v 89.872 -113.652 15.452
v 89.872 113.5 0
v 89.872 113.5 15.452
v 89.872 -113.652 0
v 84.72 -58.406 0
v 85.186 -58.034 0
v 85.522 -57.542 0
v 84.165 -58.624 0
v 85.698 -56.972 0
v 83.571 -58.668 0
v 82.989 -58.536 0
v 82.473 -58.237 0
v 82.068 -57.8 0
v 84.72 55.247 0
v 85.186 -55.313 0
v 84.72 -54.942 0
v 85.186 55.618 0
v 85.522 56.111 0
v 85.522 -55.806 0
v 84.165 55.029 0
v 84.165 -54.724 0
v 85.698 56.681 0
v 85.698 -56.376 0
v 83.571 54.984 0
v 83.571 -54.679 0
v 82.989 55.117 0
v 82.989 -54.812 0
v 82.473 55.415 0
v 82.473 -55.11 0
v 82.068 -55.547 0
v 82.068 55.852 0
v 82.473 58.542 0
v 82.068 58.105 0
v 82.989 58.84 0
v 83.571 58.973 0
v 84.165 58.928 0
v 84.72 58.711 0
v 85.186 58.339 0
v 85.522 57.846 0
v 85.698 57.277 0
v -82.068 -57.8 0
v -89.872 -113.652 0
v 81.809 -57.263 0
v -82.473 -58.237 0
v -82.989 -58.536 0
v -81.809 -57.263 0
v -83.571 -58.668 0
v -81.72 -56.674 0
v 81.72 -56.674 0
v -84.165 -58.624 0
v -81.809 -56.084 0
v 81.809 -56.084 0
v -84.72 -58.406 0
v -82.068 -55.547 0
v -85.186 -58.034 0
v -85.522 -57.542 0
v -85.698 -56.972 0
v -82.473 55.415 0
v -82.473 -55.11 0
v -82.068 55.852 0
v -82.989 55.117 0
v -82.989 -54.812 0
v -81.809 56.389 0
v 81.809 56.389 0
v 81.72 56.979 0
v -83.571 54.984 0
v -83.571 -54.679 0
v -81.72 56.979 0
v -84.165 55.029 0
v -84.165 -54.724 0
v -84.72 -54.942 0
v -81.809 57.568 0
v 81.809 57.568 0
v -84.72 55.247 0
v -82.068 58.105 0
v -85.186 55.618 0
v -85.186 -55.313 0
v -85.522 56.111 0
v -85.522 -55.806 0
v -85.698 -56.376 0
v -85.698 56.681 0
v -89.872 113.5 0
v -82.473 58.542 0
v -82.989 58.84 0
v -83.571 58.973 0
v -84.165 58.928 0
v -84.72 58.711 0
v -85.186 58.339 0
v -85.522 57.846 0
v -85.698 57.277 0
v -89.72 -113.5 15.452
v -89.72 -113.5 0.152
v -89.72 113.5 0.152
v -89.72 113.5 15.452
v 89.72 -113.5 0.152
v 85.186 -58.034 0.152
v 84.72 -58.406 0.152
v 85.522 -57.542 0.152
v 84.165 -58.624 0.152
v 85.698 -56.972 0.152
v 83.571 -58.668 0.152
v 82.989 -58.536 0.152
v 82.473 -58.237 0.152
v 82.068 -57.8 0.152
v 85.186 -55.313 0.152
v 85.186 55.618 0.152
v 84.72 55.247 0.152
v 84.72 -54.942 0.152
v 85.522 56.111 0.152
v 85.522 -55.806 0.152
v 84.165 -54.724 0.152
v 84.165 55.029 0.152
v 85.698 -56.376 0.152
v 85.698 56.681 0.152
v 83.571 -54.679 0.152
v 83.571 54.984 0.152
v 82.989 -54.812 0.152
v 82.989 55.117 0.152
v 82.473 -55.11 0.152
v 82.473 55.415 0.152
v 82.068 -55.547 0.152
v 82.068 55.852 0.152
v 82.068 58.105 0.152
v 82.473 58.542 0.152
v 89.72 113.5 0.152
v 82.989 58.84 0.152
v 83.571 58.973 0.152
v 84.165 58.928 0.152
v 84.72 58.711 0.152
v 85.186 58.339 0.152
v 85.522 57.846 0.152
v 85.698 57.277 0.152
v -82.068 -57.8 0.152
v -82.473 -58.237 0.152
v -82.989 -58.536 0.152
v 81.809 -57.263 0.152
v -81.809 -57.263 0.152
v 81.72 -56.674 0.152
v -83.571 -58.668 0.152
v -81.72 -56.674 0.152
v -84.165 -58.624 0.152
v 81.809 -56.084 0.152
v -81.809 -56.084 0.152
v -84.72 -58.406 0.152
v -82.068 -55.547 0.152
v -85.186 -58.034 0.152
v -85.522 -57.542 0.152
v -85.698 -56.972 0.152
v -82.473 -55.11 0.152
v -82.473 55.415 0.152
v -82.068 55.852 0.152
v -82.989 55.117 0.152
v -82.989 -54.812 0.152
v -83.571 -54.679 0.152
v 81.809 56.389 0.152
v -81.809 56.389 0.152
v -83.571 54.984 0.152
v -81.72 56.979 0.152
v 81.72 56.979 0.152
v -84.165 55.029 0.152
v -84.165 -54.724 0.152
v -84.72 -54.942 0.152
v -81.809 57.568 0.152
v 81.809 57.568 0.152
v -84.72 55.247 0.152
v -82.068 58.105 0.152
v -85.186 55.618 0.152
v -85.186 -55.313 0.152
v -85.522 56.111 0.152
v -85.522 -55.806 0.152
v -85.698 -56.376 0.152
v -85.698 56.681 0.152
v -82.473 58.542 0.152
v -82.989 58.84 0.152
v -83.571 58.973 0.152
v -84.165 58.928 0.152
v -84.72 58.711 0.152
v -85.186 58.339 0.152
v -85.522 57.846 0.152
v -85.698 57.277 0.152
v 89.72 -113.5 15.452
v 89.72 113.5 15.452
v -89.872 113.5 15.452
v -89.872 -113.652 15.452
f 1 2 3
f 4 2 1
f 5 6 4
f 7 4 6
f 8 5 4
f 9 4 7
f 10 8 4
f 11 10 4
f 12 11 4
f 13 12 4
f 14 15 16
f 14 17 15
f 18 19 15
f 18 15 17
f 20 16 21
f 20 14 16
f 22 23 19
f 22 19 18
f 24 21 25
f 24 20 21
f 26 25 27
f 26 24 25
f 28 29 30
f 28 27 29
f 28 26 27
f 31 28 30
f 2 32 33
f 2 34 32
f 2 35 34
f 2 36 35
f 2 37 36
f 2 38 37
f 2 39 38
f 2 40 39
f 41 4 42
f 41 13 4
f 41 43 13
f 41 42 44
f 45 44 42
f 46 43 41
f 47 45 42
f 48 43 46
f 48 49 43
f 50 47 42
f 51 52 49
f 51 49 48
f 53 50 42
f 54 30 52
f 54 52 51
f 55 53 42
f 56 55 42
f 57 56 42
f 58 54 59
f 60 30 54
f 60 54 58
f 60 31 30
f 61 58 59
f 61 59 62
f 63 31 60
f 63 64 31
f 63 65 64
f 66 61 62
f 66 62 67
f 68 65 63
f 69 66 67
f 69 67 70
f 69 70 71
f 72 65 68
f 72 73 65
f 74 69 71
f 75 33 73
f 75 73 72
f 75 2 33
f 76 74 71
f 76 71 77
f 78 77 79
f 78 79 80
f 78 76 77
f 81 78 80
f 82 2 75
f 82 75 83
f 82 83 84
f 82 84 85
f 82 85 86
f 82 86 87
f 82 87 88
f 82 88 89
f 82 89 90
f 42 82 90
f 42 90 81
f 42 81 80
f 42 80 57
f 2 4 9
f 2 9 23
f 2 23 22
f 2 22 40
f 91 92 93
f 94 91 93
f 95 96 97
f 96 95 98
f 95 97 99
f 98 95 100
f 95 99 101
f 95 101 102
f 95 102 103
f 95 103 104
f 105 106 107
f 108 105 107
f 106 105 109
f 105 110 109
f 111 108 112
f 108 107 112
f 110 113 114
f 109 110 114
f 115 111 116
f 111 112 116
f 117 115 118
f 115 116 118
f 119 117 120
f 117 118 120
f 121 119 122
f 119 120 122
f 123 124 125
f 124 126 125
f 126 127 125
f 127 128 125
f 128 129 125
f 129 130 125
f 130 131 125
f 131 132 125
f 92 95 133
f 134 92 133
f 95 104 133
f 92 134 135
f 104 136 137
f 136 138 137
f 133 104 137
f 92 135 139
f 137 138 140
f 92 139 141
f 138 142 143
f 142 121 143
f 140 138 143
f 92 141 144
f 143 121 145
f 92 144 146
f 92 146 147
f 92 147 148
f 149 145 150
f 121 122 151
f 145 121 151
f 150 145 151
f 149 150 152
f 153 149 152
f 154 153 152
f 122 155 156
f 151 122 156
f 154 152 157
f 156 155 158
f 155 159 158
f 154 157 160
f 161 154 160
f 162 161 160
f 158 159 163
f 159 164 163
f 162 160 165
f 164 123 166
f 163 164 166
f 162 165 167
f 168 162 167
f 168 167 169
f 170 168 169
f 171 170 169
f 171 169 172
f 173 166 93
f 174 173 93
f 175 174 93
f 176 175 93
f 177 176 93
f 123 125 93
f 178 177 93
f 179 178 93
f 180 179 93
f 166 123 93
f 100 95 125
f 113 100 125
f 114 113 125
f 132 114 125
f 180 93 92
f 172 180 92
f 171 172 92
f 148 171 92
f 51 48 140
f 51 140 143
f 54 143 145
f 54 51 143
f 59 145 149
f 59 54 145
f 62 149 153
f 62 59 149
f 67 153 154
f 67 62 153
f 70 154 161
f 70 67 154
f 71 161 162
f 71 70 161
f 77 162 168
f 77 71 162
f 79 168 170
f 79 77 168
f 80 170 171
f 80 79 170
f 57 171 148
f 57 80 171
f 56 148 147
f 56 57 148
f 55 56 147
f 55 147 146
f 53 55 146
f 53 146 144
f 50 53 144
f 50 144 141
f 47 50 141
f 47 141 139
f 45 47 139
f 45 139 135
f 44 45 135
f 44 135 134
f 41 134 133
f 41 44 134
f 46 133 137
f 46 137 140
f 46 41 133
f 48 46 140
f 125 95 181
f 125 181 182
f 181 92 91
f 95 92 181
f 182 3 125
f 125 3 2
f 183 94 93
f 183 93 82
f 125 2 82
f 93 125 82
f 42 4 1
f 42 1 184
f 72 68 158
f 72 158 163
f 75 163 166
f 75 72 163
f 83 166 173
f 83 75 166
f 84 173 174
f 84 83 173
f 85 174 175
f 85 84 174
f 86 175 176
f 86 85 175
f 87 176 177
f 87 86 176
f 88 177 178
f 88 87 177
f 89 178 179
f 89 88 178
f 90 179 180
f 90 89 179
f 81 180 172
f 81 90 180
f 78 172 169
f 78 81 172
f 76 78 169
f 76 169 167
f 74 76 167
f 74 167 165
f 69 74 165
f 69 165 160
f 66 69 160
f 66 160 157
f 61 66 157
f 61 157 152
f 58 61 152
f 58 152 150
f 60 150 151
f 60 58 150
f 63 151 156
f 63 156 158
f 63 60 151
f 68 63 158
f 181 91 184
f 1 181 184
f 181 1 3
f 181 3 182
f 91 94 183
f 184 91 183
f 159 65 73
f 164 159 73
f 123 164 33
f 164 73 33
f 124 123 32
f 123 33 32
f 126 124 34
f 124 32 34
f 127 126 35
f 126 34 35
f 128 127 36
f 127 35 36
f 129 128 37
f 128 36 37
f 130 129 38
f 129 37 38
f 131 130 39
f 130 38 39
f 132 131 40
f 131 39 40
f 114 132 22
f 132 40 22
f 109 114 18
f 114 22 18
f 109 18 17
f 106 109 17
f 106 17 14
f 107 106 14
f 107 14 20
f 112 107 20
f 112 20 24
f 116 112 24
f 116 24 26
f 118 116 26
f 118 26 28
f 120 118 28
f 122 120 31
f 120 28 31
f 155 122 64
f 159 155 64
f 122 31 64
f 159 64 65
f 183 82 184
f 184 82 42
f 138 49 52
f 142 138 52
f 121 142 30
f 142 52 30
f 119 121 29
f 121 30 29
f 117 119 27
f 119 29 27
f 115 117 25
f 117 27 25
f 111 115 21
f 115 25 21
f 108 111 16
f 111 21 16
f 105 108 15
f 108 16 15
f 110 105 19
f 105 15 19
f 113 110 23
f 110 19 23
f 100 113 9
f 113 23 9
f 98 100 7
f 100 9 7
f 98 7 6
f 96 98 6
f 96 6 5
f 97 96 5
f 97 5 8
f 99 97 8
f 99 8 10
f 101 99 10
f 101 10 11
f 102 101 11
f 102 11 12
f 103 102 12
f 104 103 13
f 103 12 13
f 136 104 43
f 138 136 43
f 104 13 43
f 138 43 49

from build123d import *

# Parameters (mm, degrees)
SKETCH1_W            = 89.72
SKETCH1_H            = 227
SKETCH1_R            = 2
HEAT_EXCHANGER_DEPTH = 0.1524
CONVECTION_FIN_DEPTH = 15.45166


with BuildPart() as part:
    # Sketch1 → Heat Exchanger (new body)
    with BuildSketch(Plane.XY):
        with Locations((-44.86, 0)):
            Rectangle(SKETCH1_W, SKETCH1_H)
        with Locations((-83.72, -56.6738)):
            Circle(SKETCH1_R, mode=Mode.SUBTRACT)
        with Locations((-83.72, 56.9786)):
            Circle(SKETCH1_R, mode=Mode.SUBTRACT)
    heat_exchanger = extrude(amount=HEAT_EXCHANGER_DEPTH)

    # Sketch3 → Convection Fin (add)
    with BuildSketch(Plane.XY):
        Polygon((0, -113.6524), (0, -113.5), (-89.72, -113.5), (-89.72, 113.5), (-89.8724, 113.5), (-89.8724, -113.6524), align=None)
    convection_fin = extrude(amount=CONVECTION_FIN_DEPTH)

    # Mirror1: Heat Exchanger, Convection Fin across plane
    add(heat_exchanger.mirror(Plane(origin=(0, 0, 0), x_dir=(0, 0, 1), z_dir=(1, 0, 0))))
    add(convection_fin.mirror(Plane(origin=(0, 0, 0), x_dir=(0, 0, 1), z_dir=(1, 0, 0))))


solid = part.part
